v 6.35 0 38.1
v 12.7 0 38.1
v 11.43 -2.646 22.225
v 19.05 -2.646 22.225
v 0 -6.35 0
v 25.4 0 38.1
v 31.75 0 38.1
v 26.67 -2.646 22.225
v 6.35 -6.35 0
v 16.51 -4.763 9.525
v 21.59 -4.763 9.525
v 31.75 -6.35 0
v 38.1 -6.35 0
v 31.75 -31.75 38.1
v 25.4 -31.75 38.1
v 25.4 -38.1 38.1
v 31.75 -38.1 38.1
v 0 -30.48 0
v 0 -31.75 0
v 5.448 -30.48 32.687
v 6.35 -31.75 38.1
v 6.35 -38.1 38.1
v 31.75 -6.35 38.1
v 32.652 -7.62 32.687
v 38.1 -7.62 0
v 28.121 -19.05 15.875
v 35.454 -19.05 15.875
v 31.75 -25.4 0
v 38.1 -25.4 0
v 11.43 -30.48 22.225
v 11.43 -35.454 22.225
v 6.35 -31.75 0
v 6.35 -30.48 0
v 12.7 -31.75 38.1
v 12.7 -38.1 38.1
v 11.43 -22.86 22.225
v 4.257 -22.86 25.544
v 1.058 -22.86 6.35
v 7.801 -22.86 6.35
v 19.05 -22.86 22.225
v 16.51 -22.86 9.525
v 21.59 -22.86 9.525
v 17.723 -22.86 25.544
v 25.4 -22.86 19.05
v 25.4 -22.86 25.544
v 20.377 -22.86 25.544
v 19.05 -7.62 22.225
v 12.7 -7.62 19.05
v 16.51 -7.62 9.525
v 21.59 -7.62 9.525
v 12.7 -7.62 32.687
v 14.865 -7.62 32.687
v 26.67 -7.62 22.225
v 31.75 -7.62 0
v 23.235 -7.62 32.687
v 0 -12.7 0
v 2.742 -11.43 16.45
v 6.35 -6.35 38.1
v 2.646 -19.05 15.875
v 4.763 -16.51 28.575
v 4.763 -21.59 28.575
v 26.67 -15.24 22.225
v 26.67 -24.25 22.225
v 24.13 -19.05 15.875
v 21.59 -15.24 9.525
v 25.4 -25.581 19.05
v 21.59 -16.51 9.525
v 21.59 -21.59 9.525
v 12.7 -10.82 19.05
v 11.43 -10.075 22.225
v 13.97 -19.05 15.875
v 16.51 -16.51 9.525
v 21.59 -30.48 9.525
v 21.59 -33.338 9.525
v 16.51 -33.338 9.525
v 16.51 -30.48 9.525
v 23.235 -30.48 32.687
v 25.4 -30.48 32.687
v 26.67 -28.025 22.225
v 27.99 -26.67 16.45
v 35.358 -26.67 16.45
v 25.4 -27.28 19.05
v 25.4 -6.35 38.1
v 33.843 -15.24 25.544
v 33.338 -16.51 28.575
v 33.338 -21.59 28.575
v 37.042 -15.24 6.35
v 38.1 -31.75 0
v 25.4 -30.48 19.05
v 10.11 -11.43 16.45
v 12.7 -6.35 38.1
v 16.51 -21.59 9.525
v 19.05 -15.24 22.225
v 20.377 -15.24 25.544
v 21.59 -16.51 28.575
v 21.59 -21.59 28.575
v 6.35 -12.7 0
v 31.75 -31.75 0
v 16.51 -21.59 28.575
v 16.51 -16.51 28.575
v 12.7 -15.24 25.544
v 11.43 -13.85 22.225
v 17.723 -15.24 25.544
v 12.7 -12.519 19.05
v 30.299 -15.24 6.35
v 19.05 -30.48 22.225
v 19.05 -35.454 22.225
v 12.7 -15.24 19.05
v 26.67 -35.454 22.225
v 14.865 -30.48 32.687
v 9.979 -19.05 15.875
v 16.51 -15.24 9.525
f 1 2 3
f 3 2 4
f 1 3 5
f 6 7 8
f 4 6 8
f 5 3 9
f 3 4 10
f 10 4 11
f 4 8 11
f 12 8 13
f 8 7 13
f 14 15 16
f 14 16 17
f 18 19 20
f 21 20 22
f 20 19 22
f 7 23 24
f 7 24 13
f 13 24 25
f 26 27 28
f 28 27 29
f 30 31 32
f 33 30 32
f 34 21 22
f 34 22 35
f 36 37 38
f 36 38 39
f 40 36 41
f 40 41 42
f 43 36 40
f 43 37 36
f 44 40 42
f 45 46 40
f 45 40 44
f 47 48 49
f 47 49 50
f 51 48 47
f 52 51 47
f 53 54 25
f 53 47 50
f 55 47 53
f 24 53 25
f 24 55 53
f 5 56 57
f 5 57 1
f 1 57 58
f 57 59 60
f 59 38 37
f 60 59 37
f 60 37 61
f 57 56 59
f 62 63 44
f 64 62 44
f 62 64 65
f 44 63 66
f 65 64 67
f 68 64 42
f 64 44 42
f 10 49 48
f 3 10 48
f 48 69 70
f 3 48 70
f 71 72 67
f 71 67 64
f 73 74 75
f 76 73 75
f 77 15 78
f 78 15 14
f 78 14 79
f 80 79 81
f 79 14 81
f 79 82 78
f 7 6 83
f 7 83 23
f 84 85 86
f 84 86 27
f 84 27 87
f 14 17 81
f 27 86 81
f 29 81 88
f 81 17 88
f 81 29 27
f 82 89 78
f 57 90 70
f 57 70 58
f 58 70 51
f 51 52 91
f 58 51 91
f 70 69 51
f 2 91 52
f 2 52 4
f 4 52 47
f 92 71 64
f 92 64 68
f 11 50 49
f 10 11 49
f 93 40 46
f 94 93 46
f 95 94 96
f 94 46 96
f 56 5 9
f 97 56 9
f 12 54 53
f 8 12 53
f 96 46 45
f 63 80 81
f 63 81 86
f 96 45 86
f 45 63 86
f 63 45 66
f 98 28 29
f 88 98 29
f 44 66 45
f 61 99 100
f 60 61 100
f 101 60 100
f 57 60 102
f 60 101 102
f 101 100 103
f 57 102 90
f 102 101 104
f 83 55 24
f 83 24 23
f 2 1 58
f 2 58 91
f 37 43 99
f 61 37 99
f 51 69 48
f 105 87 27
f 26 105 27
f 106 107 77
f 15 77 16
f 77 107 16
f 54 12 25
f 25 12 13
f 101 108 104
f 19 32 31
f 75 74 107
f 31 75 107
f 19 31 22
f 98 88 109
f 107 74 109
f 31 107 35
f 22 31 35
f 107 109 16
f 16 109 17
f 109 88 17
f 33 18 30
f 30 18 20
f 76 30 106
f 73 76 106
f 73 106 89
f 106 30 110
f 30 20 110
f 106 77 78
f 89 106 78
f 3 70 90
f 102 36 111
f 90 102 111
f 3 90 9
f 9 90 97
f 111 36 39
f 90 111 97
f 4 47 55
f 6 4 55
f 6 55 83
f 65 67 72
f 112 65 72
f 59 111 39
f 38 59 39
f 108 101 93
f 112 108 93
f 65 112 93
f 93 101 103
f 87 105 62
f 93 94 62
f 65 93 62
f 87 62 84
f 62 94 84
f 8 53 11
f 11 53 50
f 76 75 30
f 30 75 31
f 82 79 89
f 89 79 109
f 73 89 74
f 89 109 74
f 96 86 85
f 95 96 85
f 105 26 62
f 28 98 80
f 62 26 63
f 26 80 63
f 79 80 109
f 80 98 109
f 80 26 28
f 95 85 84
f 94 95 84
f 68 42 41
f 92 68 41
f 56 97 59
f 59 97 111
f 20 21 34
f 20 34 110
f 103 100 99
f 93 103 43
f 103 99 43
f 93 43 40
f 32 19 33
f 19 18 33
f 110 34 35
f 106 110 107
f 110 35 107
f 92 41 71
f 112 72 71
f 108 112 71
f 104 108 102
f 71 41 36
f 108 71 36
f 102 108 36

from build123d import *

# Parameters (mm, degrees)
F0_W      = 38.1
F0_H      = 38.1
F1_DEPTH  = 38.1
F6_DEPTH  = 38.1
F8_DEPTH  = 38.1
F9_W      = 25.4
F9_H      = 7.62
F10_DEPTH = 38.1


with BuildPart() as f1:
    # F0 (on Front) → F1 (new body)
    with BuildSketch(Plane.XZ):
        with Locations((19.05, 19.05)):
            Rectangle(F0_W, F0_H)
    extrude(amount=F1_DEPTH)

    # F5 (on offset) → F6 (cut)
    with BuildSketch(Plane.YZ.offset(38.1)):
        Polygon((-11.43, 16.449932), (-6.35, 38.1), (-31.75, 38.1), (-26.67, 16.449932), (-21.59, 28.575), (-16.51, 28.575), align=None)
        Polygon((-6.35, 0), (0, 0), (0, 38.1), align=None)
        Polygon((-19.05, 0), (-12.7, 0), (-19.05, 15.875), (-25.4, 0), align=None)
        Polygon((-31.75, 0), (-38.1, 38.1), (-38.1, 0), align=None)
    extrude(amount=-F6_DEPTH, mode=Mode.SUBTRACT)

    # F7 (on offset) → F8 (cut)
    with BuildSketch(Plane.XZ.offset(38.1)):
        Polygon((11.43, 22.225), (6.35, 0), (31.75, 0), (26.67, 22.225), (21.59, 9.525), (16.51, 9.525), align=None)
        Polygon((25.4, 38.1), (12.7, 38.1), (19.05, 22.225), align=None)
        Polygon((31.75, 38.1), (38.1, 0), (38.1, 38.1), align=None)
        Polygon((0, 38.1), (0, 0), (6.35, 38.1), align=None)
    extrude(amount=-F8_DEPTH, mode=Mode.SUBTRACT)

    # F9 (on offset) → F10 (cut)
    with BuildSketch(Plane.XY.offset(38.1)):
        with Locations((12.7, -26.67)):
            Rectangle(F9_W, F9_H)
        with Locations((25.4, -11.43)):
            Rectangle(F9_W, F9_H)
    extrude(amount=-F10_DEPTH, mode=Mode.SUBTRACT)


solid = f1.part
